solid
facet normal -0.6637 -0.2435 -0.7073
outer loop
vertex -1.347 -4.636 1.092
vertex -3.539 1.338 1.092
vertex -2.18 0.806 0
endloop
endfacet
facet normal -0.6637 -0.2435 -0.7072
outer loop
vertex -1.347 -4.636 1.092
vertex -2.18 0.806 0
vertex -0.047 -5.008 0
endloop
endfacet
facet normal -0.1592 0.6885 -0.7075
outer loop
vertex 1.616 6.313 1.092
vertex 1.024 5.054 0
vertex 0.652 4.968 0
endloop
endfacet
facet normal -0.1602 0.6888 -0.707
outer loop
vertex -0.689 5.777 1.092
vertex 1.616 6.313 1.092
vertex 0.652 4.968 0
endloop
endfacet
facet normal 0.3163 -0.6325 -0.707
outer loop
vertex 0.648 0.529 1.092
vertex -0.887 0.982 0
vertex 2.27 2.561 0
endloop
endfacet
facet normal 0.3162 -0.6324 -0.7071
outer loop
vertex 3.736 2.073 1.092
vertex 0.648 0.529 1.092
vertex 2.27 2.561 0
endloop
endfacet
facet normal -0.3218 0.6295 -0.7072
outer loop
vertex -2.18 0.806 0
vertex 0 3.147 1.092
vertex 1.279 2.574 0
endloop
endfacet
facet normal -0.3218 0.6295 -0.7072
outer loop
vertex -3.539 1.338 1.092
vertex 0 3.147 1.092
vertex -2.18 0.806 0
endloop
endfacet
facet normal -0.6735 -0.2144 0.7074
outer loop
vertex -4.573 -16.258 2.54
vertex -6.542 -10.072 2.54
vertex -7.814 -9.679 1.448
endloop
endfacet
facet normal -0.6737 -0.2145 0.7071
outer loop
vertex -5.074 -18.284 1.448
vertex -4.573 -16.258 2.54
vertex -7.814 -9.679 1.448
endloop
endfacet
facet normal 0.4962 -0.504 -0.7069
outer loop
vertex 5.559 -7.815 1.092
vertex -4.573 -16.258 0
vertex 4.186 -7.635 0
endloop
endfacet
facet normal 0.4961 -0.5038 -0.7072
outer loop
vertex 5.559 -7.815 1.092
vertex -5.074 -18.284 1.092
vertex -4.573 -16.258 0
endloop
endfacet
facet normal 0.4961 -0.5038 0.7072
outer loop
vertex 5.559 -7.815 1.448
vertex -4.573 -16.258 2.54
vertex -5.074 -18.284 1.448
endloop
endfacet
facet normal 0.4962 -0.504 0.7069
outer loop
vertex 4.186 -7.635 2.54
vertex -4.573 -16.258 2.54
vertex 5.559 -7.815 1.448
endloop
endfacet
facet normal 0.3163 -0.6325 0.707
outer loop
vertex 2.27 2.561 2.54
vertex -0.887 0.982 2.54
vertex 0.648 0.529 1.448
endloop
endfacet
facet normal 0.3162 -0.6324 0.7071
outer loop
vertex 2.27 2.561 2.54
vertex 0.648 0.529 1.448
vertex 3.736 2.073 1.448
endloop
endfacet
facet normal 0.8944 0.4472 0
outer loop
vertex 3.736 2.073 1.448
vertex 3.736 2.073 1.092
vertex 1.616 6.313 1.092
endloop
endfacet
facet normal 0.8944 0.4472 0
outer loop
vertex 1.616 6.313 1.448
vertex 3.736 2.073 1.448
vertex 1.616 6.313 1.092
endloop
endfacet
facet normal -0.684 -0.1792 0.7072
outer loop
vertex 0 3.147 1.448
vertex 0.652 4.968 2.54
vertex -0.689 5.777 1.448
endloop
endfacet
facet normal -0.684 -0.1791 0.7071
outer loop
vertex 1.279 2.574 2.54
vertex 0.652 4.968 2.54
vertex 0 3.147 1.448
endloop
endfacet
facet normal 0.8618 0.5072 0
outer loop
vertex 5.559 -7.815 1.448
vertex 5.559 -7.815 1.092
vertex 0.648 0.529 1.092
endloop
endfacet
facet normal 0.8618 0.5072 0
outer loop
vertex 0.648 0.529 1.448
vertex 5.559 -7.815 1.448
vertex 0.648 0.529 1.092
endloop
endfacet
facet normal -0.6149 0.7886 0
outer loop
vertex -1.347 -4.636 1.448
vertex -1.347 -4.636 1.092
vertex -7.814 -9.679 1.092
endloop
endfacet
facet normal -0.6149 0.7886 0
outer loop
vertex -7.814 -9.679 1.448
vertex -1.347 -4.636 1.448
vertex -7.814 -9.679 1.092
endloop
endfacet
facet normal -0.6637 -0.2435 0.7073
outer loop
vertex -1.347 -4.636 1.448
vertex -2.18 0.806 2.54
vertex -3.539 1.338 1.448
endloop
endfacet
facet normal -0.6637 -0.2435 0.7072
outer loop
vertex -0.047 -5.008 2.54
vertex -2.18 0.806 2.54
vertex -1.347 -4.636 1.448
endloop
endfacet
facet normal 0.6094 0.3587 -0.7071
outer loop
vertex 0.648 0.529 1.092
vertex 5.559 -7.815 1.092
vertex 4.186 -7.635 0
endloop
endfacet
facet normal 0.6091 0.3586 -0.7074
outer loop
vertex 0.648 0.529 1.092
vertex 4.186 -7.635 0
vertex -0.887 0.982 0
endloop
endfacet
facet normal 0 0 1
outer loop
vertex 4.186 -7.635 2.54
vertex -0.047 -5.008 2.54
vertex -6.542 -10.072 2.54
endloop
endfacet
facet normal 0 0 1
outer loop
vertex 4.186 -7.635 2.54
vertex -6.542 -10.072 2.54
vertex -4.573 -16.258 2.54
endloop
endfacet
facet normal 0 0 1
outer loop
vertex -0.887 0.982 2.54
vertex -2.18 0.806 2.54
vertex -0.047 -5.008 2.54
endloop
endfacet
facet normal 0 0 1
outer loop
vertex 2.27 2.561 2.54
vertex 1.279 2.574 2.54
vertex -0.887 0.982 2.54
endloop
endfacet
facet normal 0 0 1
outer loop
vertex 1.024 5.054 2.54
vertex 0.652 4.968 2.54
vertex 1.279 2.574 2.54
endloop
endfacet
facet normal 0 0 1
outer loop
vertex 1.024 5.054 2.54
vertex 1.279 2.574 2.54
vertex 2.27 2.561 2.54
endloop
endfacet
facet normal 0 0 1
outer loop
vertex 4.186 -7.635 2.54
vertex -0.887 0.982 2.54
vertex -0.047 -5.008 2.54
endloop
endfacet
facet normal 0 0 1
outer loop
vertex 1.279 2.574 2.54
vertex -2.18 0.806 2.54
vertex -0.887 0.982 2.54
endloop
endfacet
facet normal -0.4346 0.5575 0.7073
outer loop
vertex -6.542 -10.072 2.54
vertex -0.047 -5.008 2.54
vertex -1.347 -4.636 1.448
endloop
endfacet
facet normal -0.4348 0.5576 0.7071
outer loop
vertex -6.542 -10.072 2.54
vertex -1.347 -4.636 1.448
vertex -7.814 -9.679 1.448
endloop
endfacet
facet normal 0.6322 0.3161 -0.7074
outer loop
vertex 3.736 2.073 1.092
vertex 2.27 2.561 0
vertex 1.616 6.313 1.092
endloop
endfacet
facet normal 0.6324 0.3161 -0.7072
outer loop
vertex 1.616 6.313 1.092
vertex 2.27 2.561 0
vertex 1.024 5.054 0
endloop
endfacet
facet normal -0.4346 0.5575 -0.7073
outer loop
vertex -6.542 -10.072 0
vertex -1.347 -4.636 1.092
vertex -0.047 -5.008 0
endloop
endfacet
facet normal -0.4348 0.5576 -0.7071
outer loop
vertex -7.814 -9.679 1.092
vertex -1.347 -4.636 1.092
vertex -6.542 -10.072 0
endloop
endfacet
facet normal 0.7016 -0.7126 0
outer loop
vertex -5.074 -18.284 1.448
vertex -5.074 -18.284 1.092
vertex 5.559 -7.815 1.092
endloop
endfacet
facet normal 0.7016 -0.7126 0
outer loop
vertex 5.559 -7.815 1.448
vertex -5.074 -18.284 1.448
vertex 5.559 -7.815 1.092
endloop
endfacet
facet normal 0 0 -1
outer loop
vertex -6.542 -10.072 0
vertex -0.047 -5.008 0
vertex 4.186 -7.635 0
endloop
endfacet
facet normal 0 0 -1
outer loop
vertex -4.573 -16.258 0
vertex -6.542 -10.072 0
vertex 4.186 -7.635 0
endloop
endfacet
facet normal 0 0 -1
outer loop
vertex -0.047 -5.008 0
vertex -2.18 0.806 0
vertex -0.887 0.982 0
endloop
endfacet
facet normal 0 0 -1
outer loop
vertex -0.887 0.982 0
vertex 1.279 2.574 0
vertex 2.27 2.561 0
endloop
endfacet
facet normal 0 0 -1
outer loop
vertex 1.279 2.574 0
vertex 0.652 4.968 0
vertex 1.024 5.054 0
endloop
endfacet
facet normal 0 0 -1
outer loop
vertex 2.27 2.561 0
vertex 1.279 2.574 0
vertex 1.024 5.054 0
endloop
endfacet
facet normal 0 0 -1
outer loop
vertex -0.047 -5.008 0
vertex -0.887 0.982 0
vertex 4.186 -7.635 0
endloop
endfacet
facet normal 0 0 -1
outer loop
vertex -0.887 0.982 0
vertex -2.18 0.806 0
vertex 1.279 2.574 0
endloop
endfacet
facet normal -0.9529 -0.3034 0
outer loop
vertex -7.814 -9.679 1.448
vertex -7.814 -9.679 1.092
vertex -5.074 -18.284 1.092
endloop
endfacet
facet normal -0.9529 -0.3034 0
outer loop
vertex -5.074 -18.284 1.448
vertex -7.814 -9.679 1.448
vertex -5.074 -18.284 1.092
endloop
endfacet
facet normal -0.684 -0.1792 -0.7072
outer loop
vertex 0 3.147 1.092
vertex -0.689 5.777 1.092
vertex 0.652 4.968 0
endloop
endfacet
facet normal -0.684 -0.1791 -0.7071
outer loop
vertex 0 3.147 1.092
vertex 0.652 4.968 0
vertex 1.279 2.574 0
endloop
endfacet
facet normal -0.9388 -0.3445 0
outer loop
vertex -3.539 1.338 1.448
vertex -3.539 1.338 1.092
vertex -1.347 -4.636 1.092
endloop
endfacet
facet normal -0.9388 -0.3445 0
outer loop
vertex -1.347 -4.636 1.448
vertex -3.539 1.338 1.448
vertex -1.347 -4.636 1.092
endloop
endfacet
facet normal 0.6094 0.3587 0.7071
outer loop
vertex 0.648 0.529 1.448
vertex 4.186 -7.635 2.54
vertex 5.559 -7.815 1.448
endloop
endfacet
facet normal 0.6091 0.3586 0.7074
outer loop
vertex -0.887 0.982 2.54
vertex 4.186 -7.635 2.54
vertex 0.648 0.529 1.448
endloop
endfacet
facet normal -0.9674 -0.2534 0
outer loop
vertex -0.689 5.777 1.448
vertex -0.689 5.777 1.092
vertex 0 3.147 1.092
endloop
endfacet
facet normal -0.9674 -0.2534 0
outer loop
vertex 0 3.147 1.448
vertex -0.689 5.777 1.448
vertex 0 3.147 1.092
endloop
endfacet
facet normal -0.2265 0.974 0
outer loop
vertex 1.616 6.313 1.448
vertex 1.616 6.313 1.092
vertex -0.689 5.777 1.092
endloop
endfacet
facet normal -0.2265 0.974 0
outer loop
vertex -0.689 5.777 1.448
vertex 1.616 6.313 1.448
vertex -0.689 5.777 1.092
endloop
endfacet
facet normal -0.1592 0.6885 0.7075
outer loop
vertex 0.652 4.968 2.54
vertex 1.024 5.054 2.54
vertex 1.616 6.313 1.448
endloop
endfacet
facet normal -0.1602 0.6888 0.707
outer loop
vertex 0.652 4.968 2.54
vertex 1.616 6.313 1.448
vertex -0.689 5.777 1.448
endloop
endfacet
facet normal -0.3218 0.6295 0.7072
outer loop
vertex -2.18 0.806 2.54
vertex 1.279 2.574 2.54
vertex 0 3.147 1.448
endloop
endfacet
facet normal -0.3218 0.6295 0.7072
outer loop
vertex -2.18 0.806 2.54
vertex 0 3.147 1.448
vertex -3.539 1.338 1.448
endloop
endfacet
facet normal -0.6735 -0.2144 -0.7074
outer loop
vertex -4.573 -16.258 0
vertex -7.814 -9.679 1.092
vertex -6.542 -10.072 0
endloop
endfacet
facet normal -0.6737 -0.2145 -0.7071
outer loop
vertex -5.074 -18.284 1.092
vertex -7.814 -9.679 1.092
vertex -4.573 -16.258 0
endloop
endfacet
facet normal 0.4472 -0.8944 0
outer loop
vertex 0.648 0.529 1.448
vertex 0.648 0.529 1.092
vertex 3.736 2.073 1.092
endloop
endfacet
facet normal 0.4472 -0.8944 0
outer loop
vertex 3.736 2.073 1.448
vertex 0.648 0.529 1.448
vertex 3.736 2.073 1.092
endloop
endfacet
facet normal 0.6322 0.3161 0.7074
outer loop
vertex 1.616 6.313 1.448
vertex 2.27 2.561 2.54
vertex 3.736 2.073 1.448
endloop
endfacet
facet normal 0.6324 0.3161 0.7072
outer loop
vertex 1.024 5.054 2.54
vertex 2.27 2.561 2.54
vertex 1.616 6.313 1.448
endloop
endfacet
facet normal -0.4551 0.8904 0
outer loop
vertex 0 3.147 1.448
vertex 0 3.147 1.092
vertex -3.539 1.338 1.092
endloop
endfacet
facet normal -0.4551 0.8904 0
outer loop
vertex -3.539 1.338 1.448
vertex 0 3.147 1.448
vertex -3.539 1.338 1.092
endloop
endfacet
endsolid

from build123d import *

# Parameters (mm, degrees)
F1_DEPTH = 2.54
F2_SIZE  = 1.0922
F3_SIZE  = 1.0922


with BuildPart() as f1:
    # F0 (on Top) → F1 (new body)
    with BuildSketch(Plane.XY):
        Polygon((3.7357374094, 2.0727487281), (1.6156566562, 6.3129104674), (-0.688809203, 5.7773781009), (0, 3.146545263), (-3.5388784017, 1.3378473232), (-1.3465175871, -4.636336118), (-7.8139826655, -9.6787661314), (-5.0735310651, -18.2837825269), (5.5594188161, -7.8152595088), (0.6475421183, 0.5286511673), align=None)
    extrude(amount=F1_DEPTH)

    # F2
    f2_edges = [f1.edges().sort_by_distance(p)[0] for p in [
        (3.10348, -3.643304, 2.54),
        (2.19164, 1.3007, 2.54),
        (2.675697, 4.19283, 2.54),
        (0.463424, 6.045144, 2.54),
        (-0.344405, 4.461962, 2.54),
        (-1.769439, 2.242196, 2.54),
        (-2.442698, -1.649244, 2.54),
        (-4.58025, -7.157551, 2.54),
        (-6.443757, -13.981274, 2.54),
        (0.242944, -13.049521, 2.54),
    ]]
    chamfer(f2_edges, length=F2_SIZE)

    # F3
    f3_edges = [f1.edges().sort_by_distance(p)[0] for p in [
        (3.10348, -3.643304, 0),
        (2.19164, 1.3007, 0),
        (2.675697, 4.19283, 0),
        (0.463424, 6.045144, 0),
        (-0.344405, 4.461962, 0),
        (-1.769439, 2.242196, 0),
        (-2.442698, -1.649244, 0),
        (-4.58025, -7.157551, 0),
        (-6.443757, -13.981274, 0),
        (0.242944, -13.049521, 0),
    ]]
    chamfer(f3_edges, length=F3_SIZE)


solid = f1.part
